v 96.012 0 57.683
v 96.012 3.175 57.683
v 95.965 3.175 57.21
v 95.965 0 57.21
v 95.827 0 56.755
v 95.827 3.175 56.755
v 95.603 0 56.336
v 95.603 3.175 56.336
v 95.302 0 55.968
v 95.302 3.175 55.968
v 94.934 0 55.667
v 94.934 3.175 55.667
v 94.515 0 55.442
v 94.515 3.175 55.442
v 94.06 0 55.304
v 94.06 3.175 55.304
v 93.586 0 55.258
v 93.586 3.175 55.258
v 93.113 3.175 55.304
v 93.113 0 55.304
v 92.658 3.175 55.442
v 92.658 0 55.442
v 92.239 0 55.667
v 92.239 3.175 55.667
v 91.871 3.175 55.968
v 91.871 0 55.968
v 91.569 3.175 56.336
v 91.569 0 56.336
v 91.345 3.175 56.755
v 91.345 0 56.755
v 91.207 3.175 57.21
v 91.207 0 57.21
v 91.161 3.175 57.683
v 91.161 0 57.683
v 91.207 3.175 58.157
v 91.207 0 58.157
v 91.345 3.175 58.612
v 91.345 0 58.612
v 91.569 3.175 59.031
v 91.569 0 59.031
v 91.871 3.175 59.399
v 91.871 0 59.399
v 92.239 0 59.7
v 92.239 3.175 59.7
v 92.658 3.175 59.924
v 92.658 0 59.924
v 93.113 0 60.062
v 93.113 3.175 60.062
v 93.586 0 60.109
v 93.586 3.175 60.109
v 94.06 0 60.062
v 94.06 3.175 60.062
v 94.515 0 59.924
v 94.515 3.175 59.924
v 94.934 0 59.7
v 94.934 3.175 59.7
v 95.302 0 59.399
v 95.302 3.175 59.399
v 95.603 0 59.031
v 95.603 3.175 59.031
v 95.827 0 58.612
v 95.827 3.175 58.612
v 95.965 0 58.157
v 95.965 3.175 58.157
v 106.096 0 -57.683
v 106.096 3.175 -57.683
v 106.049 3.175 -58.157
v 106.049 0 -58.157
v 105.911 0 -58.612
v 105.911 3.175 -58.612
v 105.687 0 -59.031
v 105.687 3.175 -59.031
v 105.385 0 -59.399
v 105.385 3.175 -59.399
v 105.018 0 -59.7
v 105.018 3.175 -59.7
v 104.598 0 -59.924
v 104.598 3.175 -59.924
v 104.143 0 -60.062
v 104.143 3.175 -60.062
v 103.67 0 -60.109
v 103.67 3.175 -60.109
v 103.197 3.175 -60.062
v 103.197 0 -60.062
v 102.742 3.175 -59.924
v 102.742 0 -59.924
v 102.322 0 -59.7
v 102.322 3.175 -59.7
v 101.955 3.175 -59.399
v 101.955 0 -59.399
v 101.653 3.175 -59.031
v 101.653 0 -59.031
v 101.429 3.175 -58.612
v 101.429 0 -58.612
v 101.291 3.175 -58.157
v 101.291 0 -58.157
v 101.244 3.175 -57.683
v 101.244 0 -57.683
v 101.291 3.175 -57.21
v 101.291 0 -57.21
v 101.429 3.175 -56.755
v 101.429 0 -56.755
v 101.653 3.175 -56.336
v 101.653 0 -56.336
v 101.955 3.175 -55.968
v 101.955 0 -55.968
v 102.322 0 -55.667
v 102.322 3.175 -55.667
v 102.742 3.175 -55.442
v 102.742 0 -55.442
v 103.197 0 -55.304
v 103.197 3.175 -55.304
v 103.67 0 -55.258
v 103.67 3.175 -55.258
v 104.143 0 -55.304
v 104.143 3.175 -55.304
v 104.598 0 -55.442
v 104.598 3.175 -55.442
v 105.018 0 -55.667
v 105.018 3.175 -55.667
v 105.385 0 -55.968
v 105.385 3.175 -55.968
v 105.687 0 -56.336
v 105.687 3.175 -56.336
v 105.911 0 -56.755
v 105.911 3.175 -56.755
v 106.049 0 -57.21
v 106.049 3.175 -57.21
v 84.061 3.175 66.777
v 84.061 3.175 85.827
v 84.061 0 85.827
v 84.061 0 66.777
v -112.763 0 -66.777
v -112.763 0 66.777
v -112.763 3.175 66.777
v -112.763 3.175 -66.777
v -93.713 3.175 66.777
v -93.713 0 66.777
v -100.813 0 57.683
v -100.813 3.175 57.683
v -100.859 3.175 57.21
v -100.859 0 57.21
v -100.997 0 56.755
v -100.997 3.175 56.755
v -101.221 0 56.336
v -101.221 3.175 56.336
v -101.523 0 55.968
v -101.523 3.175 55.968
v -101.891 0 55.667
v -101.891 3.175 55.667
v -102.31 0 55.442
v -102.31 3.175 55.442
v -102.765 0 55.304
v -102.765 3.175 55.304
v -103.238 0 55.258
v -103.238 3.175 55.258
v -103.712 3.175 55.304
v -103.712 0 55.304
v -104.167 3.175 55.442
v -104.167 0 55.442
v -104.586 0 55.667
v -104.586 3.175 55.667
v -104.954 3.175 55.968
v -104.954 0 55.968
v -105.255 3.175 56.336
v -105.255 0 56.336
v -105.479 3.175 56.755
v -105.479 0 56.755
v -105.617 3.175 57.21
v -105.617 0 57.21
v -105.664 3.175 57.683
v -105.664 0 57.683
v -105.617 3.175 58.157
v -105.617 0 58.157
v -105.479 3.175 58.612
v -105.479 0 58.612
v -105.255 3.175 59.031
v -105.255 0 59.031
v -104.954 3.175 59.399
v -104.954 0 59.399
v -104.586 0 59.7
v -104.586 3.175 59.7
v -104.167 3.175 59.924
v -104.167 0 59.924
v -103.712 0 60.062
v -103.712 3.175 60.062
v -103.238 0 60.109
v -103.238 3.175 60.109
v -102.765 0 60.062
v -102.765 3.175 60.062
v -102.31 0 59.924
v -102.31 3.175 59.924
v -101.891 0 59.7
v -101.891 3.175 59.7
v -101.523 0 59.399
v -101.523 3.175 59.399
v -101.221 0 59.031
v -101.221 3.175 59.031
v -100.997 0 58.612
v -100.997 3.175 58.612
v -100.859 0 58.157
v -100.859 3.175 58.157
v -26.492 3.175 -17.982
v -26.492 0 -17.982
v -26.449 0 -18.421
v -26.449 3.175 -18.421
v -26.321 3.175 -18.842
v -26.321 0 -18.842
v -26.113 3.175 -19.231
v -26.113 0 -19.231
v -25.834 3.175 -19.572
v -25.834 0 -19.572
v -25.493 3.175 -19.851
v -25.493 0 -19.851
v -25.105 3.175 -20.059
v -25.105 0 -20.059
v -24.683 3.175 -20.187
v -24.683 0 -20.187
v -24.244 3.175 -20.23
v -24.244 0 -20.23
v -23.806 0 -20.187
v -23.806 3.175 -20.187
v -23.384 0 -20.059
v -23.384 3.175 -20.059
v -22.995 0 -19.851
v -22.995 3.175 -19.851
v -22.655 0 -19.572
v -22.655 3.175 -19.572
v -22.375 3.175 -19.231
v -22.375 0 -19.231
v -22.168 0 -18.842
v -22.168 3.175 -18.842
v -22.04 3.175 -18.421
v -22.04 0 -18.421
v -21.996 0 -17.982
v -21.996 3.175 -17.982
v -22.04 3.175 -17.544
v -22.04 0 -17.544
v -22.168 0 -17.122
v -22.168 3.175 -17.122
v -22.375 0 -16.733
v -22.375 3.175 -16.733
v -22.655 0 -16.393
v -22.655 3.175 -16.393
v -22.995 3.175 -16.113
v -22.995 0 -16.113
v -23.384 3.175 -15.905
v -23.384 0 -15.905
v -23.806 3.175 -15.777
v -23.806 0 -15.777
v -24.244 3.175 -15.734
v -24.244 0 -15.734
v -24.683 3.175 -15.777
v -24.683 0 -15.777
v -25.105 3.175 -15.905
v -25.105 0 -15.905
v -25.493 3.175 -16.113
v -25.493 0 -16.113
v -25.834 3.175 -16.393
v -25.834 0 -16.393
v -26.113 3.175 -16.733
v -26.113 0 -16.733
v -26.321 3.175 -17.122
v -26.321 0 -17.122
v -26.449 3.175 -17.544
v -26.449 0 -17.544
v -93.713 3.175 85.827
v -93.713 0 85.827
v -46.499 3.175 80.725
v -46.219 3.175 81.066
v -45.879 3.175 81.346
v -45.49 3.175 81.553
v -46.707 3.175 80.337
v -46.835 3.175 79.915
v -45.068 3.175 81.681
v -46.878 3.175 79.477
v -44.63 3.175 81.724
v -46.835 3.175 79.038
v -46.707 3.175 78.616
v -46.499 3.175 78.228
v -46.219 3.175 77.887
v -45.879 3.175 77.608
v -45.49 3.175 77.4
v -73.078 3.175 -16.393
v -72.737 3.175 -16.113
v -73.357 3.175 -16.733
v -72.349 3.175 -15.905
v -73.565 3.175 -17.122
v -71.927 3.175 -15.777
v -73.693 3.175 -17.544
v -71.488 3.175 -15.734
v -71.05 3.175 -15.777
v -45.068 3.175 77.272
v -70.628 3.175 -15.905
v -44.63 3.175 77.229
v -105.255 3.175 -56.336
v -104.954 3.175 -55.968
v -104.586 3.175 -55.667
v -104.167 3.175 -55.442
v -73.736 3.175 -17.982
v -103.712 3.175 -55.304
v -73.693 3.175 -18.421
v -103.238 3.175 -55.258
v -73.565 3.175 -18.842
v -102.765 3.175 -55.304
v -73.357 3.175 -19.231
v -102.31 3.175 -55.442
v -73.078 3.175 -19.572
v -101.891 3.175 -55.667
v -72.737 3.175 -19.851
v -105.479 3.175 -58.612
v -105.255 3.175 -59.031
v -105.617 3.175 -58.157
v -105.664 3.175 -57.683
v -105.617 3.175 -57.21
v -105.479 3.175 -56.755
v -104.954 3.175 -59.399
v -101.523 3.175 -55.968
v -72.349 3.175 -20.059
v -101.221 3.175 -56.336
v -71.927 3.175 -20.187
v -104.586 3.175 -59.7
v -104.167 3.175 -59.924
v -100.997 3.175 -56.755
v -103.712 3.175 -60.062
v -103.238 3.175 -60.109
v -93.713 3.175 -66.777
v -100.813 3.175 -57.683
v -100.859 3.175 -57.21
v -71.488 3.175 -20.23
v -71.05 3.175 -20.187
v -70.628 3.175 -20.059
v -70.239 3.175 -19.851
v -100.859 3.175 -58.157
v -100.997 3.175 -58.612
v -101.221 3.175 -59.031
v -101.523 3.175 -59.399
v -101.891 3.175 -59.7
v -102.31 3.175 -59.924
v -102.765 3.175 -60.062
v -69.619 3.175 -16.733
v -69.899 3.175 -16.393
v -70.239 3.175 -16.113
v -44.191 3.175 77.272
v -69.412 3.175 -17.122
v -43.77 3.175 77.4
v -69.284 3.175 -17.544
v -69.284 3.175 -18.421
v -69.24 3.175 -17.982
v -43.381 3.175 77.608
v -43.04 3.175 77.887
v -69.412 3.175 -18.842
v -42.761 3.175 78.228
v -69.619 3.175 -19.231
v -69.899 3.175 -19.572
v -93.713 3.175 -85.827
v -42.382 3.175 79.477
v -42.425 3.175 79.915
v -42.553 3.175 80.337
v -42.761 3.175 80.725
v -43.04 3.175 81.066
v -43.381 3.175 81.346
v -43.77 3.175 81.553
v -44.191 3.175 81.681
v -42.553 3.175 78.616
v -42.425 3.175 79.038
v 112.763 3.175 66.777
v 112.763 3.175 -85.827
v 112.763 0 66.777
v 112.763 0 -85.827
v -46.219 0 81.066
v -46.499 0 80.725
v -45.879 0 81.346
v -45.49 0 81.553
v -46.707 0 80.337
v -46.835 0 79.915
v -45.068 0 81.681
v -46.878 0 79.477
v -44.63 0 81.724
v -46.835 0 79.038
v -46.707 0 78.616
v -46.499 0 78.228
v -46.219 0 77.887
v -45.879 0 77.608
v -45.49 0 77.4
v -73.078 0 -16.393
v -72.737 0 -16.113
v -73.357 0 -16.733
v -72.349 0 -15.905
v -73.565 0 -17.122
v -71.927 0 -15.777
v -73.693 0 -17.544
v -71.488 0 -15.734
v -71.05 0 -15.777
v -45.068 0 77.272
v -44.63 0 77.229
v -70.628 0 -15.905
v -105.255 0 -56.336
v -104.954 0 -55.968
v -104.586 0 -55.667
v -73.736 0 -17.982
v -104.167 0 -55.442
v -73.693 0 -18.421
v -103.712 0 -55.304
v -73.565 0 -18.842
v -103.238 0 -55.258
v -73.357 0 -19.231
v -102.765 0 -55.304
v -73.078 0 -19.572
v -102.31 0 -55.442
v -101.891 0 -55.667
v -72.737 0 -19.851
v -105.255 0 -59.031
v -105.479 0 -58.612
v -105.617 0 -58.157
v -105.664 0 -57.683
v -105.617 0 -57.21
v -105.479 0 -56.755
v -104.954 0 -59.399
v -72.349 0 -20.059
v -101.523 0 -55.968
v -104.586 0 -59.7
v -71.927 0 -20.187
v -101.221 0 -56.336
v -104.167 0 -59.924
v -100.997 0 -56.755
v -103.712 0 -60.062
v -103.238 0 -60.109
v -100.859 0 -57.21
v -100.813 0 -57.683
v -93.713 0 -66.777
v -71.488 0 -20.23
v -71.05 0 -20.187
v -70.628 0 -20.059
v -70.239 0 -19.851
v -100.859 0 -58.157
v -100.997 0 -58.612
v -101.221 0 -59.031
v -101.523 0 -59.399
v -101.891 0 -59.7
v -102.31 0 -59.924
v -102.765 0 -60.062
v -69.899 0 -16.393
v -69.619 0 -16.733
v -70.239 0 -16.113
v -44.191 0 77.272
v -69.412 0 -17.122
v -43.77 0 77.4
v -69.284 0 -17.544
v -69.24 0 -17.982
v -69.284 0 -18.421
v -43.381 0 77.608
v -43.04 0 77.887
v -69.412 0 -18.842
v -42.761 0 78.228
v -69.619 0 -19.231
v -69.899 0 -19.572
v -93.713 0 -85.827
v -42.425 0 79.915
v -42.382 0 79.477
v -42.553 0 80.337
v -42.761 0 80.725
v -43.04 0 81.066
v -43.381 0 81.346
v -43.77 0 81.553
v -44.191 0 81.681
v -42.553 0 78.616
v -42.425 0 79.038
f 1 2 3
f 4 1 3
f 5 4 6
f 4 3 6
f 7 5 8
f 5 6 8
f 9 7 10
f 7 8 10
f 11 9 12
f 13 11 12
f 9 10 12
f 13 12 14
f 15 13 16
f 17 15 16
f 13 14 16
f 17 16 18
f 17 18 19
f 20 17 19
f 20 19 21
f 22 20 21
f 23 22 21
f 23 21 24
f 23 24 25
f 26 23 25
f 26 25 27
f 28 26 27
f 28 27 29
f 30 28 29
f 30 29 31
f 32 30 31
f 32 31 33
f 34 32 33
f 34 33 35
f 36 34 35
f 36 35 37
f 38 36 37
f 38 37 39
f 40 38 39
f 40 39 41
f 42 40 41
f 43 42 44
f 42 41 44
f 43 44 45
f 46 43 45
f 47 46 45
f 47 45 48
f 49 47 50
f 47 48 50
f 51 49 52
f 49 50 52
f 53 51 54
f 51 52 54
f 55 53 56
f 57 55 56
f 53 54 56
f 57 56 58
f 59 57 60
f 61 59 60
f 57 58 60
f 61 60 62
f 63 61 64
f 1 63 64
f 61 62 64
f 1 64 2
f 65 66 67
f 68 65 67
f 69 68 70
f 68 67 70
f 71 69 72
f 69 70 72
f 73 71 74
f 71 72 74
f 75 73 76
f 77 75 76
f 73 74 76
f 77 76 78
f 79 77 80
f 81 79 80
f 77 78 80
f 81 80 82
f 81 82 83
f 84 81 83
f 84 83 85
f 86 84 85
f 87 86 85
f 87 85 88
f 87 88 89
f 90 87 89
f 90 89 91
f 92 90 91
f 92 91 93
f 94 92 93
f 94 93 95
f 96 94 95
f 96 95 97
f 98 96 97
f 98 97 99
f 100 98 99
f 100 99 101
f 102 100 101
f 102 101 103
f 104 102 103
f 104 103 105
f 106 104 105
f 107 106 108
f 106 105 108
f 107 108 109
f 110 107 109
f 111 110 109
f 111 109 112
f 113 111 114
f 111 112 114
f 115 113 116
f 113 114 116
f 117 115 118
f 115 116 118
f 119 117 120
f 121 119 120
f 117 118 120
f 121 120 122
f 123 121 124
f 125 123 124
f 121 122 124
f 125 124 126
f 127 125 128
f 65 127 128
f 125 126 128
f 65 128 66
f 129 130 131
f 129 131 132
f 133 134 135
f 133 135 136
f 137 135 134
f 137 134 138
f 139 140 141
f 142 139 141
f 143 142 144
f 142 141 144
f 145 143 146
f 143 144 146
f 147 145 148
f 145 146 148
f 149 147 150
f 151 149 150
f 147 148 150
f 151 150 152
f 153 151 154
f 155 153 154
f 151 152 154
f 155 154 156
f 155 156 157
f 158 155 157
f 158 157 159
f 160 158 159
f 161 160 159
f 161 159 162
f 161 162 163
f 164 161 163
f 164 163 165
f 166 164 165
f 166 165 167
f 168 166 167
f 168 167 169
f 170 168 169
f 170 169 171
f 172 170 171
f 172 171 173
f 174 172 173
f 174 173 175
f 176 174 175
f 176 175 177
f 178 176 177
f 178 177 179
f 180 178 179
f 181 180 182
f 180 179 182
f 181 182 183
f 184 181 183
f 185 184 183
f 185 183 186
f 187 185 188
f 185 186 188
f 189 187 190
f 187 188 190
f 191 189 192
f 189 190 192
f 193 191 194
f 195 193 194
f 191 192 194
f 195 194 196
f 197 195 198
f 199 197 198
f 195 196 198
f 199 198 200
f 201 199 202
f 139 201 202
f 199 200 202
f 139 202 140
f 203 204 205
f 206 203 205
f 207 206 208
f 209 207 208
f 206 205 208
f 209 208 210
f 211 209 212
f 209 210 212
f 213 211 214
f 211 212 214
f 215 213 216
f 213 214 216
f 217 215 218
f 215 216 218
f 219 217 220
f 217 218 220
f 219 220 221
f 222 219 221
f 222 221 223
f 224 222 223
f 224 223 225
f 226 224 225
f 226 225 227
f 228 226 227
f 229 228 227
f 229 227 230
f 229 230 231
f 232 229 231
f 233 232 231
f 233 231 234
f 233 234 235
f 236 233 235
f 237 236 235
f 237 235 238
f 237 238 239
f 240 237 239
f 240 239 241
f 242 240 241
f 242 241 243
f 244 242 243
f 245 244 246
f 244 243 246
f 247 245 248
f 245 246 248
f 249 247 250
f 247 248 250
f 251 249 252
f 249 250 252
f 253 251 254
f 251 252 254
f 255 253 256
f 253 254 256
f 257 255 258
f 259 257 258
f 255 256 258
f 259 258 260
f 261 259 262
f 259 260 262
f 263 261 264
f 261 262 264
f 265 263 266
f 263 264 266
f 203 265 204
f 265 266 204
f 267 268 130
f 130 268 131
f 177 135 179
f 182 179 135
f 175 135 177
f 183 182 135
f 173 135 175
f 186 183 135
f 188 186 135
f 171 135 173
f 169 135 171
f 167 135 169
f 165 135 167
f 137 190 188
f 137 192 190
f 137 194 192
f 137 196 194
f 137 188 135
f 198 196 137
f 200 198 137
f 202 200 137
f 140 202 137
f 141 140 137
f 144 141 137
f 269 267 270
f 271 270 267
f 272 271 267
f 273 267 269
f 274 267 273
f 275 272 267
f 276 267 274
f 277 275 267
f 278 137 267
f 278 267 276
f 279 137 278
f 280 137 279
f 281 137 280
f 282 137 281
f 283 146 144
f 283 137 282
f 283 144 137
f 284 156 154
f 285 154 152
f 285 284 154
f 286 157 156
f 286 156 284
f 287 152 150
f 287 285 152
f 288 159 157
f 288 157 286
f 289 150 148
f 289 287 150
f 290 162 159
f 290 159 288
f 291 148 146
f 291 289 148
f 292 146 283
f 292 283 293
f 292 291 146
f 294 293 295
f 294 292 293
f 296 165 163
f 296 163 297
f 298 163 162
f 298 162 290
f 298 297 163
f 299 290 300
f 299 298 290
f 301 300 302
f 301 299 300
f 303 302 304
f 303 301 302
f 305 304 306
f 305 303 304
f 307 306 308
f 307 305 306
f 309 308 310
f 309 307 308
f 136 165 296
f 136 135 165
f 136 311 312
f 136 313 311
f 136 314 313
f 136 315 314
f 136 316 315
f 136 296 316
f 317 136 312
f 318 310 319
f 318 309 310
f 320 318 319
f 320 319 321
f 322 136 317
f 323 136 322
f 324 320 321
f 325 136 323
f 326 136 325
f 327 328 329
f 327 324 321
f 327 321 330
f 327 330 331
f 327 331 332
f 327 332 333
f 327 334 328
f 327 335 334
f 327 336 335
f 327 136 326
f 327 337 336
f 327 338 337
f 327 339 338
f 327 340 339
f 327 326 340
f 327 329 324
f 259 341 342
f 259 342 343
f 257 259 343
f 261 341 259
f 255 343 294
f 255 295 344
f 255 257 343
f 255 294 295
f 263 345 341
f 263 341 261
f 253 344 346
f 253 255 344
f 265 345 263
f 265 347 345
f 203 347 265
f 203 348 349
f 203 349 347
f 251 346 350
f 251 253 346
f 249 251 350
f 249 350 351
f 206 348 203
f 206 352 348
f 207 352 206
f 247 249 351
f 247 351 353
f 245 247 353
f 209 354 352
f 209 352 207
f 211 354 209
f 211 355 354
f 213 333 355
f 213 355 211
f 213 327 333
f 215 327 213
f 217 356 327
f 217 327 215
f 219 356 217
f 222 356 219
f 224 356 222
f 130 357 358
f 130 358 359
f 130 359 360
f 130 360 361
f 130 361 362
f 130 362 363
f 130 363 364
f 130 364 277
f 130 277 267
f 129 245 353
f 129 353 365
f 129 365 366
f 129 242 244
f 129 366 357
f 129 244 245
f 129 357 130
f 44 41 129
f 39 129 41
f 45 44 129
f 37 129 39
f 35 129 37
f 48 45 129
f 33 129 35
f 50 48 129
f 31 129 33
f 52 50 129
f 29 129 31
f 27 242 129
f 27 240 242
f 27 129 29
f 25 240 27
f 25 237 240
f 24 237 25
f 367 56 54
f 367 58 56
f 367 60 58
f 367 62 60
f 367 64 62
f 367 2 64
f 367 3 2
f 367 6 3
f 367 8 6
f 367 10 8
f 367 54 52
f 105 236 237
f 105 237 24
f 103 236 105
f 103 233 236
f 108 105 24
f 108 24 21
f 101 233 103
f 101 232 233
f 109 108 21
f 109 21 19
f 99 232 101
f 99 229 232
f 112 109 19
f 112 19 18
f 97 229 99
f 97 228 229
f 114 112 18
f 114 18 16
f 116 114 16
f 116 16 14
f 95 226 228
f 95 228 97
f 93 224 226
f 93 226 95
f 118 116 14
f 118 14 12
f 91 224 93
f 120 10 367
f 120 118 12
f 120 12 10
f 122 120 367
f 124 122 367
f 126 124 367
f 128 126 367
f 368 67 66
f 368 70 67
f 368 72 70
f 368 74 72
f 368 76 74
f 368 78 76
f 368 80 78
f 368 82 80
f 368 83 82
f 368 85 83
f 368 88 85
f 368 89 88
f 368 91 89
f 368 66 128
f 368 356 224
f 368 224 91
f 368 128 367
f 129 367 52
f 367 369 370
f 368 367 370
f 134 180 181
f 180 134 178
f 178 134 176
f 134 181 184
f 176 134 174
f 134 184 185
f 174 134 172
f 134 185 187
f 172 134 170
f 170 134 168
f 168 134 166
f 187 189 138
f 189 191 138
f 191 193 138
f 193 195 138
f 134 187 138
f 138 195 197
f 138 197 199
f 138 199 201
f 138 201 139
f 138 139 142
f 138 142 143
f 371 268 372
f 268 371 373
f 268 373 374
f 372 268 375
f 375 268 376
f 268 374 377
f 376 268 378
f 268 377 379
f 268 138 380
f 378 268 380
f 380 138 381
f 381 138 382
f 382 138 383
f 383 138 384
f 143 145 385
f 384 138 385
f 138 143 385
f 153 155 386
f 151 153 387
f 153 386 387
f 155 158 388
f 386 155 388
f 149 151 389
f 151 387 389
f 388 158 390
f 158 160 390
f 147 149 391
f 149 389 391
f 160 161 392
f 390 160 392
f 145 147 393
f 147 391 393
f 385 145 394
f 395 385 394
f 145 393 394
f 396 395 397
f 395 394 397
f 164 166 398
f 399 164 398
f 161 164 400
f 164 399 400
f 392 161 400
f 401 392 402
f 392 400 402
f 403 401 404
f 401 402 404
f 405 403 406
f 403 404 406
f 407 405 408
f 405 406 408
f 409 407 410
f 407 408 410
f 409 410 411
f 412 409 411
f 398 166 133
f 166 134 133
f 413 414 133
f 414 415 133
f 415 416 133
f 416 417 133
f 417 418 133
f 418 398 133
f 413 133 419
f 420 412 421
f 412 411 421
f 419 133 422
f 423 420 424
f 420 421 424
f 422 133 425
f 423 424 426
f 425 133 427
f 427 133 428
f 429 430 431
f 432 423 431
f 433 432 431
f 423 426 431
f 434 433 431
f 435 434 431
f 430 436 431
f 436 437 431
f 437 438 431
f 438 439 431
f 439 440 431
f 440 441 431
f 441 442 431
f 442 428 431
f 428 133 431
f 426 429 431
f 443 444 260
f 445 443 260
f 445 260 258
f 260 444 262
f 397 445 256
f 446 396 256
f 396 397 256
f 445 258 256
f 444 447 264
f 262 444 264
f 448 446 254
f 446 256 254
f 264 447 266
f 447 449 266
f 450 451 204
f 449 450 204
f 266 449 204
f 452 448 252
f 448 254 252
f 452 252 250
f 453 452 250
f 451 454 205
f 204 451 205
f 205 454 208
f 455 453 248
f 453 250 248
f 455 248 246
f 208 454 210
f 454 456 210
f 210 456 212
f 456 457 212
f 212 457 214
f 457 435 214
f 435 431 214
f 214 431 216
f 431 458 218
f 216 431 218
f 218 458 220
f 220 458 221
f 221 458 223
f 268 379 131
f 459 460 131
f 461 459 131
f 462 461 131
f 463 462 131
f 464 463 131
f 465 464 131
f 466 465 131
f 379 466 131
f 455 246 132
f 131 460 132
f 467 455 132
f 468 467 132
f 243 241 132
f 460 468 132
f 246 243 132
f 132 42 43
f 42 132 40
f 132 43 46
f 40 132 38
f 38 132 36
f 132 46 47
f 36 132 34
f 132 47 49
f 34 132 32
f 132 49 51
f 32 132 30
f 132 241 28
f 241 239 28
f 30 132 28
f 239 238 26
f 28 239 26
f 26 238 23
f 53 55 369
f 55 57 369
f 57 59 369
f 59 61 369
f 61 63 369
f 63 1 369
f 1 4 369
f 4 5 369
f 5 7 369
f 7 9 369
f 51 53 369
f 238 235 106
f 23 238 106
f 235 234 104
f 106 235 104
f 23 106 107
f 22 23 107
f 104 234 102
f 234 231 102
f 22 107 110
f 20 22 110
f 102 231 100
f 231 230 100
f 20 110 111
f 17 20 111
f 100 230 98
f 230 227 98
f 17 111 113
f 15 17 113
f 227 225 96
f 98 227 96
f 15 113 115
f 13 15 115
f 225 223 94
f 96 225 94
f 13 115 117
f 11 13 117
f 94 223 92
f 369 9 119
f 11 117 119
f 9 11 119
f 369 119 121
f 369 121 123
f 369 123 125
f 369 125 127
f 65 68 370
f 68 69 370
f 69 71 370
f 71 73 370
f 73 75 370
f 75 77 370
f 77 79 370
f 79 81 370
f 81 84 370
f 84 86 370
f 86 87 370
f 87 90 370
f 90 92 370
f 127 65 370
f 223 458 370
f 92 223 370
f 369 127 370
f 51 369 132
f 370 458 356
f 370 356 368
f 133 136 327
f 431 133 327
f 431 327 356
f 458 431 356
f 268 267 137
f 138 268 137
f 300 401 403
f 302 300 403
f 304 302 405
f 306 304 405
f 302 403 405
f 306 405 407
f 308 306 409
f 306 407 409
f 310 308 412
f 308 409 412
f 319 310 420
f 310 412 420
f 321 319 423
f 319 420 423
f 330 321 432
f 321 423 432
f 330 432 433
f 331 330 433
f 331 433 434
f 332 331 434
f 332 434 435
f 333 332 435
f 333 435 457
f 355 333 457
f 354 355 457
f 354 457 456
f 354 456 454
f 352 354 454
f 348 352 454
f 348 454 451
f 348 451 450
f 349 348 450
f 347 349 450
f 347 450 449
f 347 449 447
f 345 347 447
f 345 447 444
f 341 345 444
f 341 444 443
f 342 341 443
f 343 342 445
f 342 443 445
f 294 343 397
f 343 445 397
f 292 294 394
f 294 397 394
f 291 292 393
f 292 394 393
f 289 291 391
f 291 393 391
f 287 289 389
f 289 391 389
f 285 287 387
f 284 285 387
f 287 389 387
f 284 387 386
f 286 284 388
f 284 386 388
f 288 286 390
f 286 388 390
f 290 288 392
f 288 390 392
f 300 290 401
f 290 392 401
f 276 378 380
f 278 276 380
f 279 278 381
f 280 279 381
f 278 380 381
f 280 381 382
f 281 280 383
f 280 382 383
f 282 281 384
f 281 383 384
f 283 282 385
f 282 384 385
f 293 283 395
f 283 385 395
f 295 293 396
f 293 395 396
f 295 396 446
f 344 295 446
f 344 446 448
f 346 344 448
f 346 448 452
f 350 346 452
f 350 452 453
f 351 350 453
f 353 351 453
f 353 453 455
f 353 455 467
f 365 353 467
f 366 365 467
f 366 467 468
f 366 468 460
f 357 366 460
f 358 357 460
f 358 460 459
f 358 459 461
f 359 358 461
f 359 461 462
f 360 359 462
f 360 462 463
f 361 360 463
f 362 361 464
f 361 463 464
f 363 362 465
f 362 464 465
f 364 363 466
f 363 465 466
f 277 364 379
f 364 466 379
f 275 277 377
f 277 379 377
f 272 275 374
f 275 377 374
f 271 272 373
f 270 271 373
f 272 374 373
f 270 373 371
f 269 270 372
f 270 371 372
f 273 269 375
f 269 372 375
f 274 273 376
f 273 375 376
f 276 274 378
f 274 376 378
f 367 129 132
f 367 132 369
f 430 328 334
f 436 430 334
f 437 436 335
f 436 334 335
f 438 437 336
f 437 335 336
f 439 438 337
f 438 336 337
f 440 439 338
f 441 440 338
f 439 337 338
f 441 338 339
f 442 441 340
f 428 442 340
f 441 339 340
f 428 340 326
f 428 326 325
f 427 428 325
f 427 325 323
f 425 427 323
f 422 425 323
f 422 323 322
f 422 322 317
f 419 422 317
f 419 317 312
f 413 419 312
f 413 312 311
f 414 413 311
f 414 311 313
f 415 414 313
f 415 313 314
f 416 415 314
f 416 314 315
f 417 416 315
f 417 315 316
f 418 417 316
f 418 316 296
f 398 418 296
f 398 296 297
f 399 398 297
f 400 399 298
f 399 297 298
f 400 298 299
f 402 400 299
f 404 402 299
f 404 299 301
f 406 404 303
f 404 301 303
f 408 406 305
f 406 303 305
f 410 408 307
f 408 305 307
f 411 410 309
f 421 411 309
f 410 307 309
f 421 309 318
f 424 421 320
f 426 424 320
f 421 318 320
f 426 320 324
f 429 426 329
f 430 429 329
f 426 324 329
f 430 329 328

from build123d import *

# Parameters (mm, degrees)
SKETCH1_W             = 225.5266
SKETCH1_H             = 171.6532
BOSS_EXTRUDE1_DEPTH   = 3.175
SKETCH2_W             = 19.05
SKETCH2_H             = 19.05
SKETCH2_W_2           = 28.702
CORNERCUT_DEPTH       = 4.175
SKETCH3_R             = 2.4257
MOUNTHOLES_DEPTH      = 4.175
F_8_CLEARANCE_HOLE1_D = 4.4958


with BuildPart() as part:
    # Sketch1 → Boss-Extrude1 (new body)
    with BuildSketch(Plane(origin=(0, 0, 0), x_dir=(1, 0, 0), z_dir=(0, 1, 0))):
        Rectangle(SKETCH1_W, SKETCH1_H)
    extrude(amount=BOSS_EXTRUDE1_DEPTH)

    # Sketch2 → CornerCut (cut, through all)
    with BuildSketch(Plane(origin=(0, 3.175, 0), x_dir=(1, 0, 0), z_dir=(0, 1, 0))):
        with Locations((-103.2383, 76.3016)):
            Rectangle(SKETCH2_W, SKETCH2_H)
        with Locations((98.4123, -76.3016)):
            Rectangle(SKETCH2_W_2, SKETCH2_H)
        with Locations((-103.2383, -76.3016)):
            Rectangle(SKETCH2_W, SKETCH2_H)
    extrude(amount=-CORNERCUT_DEPTH, mode=Mode.SUBTRACT)

    # Sketch3 → MountHoles (cut, through all)
    with BuildSketch(Plane(origin=(0, 3.175, 0), x_dir=(1, 0, 0), z_dir=(0, 1, 0))):
        with Locations((-103.2383, 57.6834)):
            Circle(SKETCH3_R)
        with Locations((-103.2383, -57.6834)):
            Circle(SKETCH3_R)
        with Locations((93.5863, -57.6834)):
            Circle(SKETCH3_R)
        with Locations((103.6701, 57.6834)):
            Circle(SKETCH3_R)
    extrude(amount=-MOUNTHOLES_DEPTH, mode=Mode.SUBTRACT)

    # #8 Clearance Hole1 (through all)
    with Locations(Plane(origin=(0, 3.175, 0), x_dir=(1, 0, 0), z_dir=(0, 1, 0))):
        with Locations((-44.629848387, -79.4766), (-24.2443, 17.982191502), (-71.4883, 17.982191502)):
            Hole(F_8_CLEARANCE_HOLE1_D / 2)


solid = part.part
